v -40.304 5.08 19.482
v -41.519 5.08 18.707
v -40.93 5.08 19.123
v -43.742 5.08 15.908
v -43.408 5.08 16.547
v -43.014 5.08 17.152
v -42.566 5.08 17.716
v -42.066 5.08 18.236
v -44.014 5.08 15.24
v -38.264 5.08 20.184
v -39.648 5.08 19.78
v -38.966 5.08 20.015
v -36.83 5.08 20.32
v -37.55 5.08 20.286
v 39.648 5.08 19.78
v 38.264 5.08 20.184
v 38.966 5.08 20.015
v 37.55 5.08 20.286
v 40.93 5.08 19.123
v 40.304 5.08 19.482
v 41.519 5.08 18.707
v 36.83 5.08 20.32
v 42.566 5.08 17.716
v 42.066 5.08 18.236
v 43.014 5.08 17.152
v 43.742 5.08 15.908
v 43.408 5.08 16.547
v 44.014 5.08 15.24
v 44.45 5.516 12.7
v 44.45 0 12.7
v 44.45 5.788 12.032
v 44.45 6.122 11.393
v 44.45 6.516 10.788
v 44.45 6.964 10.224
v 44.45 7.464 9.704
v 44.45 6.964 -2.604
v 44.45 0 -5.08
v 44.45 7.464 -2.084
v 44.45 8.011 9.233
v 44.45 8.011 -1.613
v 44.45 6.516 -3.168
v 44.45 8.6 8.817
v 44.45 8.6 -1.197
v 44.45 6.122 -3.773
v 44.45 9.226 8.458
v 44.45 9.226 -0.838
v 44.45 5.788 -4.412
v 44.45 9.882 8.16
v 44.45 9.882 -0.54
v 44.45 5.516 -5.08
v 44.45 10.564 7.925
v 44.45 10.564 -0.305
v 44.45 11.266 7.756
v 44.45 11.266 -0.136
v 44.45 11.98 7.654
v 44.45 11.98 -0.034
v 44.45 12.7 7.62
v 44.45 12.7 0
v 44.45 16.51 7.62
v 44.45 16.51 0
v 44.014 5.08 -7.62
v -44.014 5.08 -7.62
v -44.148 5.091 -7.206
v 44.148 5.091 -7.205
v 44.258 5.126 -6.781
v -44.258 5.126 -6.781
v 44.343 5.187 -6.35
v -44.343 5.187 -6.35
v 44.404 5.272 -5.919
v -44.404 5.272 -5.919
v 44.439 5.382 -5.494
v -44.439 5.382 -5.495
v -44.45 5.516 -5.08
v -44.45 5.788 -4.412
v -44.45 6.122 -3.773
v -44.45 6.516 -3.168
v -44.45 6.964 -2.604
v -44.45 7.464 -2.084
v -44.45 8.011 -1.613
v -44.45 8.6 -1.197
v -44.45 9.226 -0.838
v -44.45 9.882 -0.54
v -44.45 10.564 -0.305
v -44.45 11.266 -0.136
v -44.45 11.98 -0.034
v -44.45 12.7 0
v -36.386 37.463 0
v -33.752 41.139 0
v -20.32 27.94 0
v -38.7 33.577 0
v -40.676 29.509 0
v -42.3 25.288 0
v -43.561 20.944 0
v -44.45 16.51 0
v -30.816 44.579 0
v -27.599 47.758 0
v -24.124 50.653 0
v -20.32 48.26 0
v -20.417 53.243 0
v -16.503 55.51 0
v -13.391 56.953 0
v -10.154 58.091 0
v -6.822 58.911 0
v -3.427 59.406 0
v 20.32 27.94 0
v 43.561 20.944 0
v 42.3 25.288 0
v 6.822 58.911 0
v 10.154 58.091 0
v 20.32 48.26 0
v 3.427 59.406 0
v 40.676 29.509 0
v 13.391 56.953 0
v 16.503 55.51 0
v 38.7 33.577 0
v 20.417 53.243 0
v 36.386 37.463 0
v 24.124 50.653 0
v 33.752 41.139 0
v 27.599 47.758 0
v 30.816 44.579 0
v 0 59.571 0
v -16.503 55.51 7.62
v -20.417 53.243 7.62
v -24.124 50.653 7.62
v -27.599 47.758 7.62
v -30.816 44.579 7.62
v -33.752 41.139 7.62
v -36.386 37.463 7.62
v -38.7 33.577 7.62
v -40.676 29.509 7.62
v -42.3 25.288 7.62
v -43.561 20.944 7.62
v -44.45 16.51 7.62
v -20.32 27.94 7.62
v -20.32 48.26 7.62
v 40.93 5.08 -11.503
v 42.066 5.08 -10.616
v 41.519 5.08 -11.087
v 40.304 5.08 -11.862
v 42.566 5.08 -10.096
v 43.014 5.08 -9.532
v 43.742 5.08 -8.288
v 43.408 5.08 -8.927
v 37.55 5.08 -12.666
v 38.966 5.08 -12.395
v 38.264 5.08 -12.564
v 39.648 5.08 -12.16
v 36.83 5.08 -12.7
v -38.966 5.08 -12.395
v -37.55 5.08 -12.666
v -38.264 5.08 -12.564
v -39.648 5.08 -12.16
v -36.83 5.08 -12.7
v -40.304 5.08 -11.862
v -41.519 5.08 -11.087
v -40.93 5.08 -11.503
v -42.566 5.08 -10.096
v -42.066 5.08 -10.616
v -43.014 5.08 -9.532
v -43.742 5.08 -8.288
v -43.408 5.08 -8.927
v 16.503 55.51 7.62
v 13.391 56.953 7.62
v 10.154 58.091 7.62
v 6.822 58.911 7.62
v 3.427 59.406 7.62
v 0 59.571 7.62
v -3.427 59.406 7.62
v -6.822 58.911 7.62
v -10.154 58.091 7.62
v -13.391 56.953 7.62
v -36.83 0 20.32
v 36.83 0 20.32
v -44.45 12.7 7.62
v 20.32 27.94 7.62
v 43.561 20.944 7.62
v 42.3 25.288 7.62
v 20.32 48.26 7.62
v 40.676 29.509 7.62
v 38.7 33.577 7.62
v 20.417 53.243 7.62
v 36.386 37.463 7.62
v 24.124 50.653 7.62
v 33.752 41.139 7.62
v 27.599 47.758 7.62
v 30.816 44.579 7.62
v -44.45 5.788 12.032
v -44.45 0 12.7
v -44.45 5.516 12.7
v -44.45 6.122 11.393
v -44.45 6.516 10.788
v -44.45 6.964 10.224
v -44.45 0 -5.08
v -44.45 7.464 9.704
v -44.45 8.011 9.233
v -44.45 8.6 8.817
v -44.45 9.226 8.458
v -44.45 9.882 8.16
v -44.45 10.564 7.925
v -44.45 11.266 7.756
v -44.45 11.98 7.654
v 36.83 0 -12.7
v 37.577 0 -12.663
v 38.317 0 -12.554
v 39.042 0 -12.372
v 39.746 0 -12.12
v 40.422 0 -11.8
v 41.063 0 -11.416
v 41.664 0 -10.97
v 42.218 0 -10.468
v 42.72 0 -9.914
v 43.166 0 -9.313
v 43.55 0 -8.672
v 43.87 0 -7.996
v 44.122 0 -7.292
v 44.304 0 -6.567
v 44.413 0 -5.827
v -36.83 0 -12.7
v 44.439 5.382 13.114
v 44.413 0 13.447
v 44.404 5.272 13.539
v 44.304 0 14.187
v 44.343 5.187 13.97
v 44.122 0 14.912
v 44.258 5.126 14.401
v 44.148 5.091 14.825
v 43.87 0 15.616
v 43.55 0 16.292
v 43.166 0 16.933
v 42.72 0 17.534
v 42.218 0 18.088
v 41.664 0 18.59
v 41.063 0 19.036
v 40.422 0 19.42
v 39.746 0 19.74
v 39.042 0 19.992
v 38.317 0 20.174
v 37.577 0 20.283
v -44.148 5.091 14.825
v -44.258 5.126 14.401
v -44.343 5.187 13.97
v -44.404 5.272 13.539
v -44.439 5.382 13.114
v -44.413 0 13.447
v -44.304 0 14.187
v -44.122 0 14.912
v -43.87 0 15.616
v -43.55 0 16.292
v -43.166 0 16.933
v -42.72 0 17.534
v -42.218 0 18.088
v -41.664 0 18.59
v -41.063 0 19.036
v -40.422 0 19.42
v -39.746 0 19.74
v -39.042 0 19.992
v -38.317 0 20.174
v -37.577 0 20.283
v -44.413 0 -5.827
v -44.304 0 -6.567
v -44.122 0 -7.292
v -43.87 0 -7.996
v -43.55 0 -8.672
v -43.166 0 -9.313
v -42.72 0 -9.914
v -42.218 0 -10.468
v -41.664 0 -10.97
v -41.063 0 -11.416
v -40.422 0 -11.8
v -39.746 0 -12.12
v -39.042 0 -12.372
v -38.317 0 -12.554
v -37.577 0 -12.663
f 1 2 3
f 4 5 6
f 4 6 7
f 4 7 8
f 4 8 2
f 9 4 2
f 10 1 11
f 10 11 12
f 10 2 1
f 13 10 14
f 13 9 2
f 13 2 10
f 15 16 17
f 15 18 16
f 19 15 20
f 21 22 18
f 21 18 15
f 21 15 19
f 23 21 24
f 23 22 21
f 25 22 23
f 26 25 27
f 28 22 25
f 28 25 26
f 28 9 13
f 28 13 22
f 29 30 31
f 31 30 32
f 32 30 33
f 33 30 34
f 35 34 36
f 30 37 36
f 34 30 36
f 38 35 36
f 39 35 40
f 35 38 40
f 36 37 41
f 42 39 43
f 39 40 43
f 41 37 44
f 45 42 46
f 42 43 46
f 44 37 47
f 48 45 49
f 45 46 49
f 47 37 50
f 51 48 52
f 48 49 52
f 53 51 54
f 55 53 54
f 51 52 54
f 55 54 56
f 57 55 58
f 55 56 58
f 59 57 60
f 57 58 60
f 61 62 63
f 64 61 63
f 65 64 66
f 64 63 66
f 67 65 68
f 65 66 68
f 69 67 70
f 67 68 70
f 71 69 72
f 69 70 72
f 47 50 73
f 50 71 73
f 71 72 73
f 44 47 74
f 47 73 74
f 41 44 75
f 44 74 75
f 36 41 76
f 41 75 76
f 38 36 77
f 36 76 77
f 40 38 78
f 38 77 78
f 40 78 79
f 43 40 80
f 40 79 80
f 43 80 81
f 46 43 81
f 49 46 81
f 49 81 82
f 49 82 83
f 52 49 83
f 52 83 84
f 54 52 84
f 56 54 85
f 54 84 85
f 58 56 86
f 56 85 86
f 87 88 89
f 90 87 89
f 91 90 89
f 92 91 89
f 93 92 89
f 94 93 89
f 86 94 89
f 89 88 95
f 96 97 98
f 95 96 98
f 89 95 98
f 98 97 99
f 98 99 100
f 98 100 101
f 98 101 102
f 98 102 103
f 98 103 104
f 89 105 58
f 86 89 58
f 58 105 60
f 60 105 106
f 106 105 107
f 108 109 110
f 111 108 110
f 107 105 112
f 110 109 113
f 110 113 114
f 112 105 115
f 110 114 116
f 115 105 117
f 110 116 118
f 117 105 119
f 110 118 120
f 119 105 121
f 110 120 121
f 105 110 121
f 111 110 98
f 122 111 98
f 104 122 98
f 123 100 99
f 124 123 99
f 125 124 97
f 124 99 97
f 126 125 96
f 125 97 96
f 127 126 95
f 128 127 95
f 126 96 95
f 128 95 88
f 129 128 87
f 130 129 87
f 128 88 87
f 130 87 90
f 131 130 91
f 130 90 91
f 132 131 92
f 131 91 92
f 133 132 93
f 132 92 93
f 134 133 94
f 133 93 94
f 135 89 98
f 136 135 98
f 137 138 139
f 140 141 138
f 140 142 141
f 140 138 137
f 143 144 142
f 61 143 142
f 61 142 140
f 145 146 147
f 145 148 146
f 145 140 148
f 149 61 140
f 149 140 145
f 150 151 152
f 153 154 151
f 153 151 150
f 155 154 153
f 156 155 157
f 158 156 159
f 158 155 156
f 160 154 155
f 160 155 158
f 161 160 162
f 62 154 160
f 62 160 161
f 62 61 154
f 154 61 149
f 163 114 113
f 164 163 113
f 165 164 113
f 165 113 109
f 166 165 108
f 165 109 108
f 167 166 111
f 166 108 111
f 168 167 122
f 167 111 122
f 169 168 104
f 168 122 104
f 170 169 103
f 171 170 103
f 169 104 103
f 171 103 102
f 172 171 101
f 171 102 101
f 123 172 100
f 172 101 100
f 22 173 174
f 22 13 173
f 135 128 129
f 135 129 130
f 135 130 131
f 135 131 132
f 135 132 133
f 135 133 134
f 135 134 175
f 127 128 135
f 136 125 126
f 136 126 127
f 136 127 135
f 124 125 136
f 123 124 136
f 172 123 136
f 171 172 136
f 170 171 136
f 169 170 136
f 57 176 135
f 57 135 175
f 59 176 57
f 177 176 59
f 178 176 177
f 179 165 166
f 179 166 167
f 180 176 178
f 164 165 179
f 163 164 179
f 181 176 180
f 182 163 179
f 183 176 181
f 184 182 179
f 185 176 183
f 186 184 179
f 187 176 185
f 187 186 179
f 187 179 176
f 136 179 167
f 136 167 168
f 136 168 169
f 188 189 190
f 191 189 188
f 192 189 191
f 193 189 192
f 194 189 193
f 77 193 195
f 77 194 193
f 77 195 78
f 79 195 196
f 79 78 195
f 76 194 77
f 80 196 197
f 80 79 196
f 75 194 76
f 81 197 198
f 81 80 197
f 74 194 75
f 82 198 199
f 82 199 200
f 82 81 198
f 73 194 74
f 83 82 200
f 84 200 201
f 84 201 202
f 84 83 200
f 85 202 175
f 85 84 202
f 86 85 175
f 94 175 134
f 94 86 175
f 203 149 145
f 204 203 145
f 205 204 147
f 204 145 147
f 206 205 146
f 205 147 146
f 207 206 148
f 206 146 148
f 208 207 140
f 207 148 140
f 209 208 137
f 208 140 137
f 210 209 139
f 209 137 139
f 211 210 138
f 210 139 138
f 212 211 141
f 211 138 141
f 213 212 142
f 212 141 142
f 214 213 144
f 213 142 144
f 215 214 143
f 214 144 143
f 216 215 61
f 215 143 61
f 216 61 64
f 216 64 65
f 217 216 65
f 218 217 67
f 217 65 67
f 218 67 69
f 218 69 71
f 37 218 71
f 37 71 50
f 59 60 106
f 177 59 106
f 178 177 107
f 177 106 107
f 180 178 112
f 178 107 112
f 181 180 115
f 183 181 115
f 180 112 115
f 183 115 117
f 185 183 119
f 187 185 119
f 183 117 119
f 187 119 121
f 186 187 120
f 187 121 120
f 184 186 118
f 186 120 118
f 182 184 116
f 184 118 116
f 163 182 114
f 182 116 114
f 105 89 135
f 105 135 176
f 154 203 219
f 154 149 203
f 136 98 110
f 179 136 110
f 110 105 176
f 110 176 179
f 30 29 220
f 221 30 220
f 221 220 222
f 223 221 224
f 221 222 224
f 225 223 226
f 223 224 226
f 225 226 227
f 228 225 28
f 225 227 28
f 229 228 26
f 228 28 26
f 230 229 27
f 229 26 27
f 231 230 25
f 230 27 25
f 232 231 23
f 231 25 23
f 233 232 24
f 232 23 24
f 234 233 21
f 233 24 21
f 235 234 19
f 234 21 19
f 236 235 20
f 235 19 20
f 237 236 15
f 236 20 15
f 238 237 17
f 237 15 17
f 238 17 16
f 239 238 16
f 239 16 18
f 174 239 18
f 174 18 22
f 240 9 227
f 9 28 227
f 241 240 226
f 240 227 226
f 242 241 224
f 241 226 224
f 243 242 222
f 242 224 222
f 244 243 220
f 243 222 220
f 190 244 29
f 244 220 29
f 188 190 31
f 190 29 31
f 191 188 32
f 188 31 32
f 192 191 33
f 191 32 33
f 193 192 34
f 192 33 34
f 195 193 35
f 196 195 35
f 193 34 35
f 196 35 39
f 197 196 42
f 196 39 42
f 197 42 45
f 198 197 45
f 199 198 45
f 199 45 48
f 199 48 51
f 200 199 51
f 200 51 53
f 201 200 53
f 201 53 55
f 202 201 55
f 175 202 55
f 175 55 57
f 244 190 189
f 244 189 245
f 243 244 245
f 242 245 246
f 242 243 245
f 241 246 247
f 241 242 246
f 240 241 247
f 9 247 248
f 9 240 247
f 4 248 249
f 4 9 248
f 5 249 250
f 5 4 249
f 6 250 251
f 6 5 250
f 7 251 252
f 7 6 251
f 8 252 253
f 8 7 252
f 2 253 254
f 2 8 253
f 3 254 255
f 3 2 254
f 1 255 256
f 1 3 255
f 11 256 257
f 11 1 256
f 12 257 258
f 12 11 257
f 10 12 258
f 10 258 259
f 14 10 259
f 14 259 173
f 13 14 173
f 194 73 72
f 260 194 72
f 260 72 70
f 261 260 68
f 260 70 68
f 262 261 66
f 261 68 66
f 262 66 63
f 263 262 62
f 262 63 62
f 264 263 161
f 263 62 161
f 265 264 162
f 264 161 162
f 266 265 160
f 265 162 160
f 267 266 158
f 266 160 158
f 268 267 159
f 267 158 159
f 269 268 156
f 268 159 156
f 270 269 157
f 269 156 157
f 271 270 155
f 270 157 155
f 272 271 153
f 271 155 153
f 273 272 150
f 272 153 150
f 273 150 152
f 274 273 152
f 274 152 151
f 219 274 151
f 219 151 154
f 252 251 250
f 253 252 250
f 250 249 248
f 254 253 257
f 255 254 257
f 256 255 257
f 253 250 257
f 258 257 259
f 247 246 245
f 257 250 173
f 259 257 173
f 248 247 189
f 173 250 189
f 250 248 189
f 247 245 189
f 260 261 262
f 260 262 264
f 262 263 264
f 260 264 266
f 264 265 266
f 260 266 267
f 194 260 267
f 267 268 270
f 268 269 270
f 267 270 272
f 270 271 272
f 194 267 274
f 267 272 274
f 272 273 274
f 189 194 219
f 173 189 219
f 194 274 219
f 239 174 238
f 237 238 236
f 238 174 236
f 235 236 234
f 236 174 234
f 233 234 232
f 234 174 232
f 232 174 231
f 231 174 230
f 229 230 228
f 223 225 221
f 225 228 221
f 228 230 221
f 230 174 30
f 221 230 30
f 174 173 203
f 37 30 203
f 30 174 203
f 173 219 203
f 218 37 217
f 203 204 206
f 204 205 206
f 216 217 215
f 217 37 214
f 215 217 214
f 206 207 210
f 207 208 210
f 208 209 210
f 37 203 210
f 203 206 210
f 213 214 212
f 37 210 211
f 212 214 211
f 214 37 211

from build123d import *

# Parameters (mm, degrees)
SKETCH1_W           = 40.64
SKETCH1_H           = 20.32
BOSS_EXTRUDE1_DEPTH = 7.62
SKETCH2_W           = 88.9
SKETCH2_H           = 5.08
BOSS_EXTRUDE2_DEPTH = 12.7
SKETCH3_W           = 88.9
SKETCH3_H           = 5.08
BOSS_EXTRUDE3_DEPTH = 12.7
FILLET1_R           = 7.62
FILLET2_R           = 7.62


with BuildPart() as part:
    # Sketch1 → Boss-Extrude1 (new body)
    with BuildSketch(Plane.XY):
        with BuildLine():
            Line((-44.45, 16.51), (-44.45, 0))
            Line((-44.45, 0), (44.45, 0))
            Line((44.45, 0), (44.45, 16.51))
            ThreePointArc((44.45, 16.51), (35.108257793, 39.328942839), (16.502983922, 55.509674712))
            ThreePointArc((16.502983922, 55.509674712), (0, 59.571022016), (-16.502983922, 55.509674712))
            ThreePointArc((-16.502983922, 55.509674712), (-35.108257793, 39.328942839), (-44.45, 16.51))
        make_face()
        with Locations((0, 38.1)):
            Rectangle(SKETCH1_W, SKETCH1_H, mode=Mode.SUBTRACT)
    extrude(amount=BOSS_EXTRUDE1_DEPTH)

    # Sketch2 → Boss-Extrude2 (add)
    with BuildSketch(Plane(origin=(0, 0, 0), x_dir=(-1, 0, 0), z_dir=(0, 0, -1))):
        with Locations((0, 2.54)):
            Rectangle(SKETCH2_W, SKETCH2_H)
    extrude(amount=BOSS_EXTRUDE2_DEPTH)

    # Sketch3 → Boss-Extrude3 (add)
    with BuildSketch(Plane.XY.offset(7.62)):
        with Locations((0, 2.54)):
            Rectangle(SKETCH3_W, SKETCH3_H)
    extrude(amount=BOSS_EXTRUDE3_DEPTH)

    # Fillet1
    fillet1_edges = [part.edges().sort_by_distance(p)[0] for p in [
        (0, 5.08, 0),
        (-44.45, 2.54, 20.32),
        (44.45, 2.54, 20.32),
    ]]
    fillet(fillet1_edges, radius=FILLET1_R)

    # Fillet2
    fillet2_edges = [part.edges().sort_by_distance(p)[0] for p in [
        (-44.45, 2.54, -12.7),
        (0, 5.08, 7.62),
        (44.45, 2.54, -12.7),
    ]]
    fillet(fillet2_edges, radius=FILLET2_R)


solid = part.part
